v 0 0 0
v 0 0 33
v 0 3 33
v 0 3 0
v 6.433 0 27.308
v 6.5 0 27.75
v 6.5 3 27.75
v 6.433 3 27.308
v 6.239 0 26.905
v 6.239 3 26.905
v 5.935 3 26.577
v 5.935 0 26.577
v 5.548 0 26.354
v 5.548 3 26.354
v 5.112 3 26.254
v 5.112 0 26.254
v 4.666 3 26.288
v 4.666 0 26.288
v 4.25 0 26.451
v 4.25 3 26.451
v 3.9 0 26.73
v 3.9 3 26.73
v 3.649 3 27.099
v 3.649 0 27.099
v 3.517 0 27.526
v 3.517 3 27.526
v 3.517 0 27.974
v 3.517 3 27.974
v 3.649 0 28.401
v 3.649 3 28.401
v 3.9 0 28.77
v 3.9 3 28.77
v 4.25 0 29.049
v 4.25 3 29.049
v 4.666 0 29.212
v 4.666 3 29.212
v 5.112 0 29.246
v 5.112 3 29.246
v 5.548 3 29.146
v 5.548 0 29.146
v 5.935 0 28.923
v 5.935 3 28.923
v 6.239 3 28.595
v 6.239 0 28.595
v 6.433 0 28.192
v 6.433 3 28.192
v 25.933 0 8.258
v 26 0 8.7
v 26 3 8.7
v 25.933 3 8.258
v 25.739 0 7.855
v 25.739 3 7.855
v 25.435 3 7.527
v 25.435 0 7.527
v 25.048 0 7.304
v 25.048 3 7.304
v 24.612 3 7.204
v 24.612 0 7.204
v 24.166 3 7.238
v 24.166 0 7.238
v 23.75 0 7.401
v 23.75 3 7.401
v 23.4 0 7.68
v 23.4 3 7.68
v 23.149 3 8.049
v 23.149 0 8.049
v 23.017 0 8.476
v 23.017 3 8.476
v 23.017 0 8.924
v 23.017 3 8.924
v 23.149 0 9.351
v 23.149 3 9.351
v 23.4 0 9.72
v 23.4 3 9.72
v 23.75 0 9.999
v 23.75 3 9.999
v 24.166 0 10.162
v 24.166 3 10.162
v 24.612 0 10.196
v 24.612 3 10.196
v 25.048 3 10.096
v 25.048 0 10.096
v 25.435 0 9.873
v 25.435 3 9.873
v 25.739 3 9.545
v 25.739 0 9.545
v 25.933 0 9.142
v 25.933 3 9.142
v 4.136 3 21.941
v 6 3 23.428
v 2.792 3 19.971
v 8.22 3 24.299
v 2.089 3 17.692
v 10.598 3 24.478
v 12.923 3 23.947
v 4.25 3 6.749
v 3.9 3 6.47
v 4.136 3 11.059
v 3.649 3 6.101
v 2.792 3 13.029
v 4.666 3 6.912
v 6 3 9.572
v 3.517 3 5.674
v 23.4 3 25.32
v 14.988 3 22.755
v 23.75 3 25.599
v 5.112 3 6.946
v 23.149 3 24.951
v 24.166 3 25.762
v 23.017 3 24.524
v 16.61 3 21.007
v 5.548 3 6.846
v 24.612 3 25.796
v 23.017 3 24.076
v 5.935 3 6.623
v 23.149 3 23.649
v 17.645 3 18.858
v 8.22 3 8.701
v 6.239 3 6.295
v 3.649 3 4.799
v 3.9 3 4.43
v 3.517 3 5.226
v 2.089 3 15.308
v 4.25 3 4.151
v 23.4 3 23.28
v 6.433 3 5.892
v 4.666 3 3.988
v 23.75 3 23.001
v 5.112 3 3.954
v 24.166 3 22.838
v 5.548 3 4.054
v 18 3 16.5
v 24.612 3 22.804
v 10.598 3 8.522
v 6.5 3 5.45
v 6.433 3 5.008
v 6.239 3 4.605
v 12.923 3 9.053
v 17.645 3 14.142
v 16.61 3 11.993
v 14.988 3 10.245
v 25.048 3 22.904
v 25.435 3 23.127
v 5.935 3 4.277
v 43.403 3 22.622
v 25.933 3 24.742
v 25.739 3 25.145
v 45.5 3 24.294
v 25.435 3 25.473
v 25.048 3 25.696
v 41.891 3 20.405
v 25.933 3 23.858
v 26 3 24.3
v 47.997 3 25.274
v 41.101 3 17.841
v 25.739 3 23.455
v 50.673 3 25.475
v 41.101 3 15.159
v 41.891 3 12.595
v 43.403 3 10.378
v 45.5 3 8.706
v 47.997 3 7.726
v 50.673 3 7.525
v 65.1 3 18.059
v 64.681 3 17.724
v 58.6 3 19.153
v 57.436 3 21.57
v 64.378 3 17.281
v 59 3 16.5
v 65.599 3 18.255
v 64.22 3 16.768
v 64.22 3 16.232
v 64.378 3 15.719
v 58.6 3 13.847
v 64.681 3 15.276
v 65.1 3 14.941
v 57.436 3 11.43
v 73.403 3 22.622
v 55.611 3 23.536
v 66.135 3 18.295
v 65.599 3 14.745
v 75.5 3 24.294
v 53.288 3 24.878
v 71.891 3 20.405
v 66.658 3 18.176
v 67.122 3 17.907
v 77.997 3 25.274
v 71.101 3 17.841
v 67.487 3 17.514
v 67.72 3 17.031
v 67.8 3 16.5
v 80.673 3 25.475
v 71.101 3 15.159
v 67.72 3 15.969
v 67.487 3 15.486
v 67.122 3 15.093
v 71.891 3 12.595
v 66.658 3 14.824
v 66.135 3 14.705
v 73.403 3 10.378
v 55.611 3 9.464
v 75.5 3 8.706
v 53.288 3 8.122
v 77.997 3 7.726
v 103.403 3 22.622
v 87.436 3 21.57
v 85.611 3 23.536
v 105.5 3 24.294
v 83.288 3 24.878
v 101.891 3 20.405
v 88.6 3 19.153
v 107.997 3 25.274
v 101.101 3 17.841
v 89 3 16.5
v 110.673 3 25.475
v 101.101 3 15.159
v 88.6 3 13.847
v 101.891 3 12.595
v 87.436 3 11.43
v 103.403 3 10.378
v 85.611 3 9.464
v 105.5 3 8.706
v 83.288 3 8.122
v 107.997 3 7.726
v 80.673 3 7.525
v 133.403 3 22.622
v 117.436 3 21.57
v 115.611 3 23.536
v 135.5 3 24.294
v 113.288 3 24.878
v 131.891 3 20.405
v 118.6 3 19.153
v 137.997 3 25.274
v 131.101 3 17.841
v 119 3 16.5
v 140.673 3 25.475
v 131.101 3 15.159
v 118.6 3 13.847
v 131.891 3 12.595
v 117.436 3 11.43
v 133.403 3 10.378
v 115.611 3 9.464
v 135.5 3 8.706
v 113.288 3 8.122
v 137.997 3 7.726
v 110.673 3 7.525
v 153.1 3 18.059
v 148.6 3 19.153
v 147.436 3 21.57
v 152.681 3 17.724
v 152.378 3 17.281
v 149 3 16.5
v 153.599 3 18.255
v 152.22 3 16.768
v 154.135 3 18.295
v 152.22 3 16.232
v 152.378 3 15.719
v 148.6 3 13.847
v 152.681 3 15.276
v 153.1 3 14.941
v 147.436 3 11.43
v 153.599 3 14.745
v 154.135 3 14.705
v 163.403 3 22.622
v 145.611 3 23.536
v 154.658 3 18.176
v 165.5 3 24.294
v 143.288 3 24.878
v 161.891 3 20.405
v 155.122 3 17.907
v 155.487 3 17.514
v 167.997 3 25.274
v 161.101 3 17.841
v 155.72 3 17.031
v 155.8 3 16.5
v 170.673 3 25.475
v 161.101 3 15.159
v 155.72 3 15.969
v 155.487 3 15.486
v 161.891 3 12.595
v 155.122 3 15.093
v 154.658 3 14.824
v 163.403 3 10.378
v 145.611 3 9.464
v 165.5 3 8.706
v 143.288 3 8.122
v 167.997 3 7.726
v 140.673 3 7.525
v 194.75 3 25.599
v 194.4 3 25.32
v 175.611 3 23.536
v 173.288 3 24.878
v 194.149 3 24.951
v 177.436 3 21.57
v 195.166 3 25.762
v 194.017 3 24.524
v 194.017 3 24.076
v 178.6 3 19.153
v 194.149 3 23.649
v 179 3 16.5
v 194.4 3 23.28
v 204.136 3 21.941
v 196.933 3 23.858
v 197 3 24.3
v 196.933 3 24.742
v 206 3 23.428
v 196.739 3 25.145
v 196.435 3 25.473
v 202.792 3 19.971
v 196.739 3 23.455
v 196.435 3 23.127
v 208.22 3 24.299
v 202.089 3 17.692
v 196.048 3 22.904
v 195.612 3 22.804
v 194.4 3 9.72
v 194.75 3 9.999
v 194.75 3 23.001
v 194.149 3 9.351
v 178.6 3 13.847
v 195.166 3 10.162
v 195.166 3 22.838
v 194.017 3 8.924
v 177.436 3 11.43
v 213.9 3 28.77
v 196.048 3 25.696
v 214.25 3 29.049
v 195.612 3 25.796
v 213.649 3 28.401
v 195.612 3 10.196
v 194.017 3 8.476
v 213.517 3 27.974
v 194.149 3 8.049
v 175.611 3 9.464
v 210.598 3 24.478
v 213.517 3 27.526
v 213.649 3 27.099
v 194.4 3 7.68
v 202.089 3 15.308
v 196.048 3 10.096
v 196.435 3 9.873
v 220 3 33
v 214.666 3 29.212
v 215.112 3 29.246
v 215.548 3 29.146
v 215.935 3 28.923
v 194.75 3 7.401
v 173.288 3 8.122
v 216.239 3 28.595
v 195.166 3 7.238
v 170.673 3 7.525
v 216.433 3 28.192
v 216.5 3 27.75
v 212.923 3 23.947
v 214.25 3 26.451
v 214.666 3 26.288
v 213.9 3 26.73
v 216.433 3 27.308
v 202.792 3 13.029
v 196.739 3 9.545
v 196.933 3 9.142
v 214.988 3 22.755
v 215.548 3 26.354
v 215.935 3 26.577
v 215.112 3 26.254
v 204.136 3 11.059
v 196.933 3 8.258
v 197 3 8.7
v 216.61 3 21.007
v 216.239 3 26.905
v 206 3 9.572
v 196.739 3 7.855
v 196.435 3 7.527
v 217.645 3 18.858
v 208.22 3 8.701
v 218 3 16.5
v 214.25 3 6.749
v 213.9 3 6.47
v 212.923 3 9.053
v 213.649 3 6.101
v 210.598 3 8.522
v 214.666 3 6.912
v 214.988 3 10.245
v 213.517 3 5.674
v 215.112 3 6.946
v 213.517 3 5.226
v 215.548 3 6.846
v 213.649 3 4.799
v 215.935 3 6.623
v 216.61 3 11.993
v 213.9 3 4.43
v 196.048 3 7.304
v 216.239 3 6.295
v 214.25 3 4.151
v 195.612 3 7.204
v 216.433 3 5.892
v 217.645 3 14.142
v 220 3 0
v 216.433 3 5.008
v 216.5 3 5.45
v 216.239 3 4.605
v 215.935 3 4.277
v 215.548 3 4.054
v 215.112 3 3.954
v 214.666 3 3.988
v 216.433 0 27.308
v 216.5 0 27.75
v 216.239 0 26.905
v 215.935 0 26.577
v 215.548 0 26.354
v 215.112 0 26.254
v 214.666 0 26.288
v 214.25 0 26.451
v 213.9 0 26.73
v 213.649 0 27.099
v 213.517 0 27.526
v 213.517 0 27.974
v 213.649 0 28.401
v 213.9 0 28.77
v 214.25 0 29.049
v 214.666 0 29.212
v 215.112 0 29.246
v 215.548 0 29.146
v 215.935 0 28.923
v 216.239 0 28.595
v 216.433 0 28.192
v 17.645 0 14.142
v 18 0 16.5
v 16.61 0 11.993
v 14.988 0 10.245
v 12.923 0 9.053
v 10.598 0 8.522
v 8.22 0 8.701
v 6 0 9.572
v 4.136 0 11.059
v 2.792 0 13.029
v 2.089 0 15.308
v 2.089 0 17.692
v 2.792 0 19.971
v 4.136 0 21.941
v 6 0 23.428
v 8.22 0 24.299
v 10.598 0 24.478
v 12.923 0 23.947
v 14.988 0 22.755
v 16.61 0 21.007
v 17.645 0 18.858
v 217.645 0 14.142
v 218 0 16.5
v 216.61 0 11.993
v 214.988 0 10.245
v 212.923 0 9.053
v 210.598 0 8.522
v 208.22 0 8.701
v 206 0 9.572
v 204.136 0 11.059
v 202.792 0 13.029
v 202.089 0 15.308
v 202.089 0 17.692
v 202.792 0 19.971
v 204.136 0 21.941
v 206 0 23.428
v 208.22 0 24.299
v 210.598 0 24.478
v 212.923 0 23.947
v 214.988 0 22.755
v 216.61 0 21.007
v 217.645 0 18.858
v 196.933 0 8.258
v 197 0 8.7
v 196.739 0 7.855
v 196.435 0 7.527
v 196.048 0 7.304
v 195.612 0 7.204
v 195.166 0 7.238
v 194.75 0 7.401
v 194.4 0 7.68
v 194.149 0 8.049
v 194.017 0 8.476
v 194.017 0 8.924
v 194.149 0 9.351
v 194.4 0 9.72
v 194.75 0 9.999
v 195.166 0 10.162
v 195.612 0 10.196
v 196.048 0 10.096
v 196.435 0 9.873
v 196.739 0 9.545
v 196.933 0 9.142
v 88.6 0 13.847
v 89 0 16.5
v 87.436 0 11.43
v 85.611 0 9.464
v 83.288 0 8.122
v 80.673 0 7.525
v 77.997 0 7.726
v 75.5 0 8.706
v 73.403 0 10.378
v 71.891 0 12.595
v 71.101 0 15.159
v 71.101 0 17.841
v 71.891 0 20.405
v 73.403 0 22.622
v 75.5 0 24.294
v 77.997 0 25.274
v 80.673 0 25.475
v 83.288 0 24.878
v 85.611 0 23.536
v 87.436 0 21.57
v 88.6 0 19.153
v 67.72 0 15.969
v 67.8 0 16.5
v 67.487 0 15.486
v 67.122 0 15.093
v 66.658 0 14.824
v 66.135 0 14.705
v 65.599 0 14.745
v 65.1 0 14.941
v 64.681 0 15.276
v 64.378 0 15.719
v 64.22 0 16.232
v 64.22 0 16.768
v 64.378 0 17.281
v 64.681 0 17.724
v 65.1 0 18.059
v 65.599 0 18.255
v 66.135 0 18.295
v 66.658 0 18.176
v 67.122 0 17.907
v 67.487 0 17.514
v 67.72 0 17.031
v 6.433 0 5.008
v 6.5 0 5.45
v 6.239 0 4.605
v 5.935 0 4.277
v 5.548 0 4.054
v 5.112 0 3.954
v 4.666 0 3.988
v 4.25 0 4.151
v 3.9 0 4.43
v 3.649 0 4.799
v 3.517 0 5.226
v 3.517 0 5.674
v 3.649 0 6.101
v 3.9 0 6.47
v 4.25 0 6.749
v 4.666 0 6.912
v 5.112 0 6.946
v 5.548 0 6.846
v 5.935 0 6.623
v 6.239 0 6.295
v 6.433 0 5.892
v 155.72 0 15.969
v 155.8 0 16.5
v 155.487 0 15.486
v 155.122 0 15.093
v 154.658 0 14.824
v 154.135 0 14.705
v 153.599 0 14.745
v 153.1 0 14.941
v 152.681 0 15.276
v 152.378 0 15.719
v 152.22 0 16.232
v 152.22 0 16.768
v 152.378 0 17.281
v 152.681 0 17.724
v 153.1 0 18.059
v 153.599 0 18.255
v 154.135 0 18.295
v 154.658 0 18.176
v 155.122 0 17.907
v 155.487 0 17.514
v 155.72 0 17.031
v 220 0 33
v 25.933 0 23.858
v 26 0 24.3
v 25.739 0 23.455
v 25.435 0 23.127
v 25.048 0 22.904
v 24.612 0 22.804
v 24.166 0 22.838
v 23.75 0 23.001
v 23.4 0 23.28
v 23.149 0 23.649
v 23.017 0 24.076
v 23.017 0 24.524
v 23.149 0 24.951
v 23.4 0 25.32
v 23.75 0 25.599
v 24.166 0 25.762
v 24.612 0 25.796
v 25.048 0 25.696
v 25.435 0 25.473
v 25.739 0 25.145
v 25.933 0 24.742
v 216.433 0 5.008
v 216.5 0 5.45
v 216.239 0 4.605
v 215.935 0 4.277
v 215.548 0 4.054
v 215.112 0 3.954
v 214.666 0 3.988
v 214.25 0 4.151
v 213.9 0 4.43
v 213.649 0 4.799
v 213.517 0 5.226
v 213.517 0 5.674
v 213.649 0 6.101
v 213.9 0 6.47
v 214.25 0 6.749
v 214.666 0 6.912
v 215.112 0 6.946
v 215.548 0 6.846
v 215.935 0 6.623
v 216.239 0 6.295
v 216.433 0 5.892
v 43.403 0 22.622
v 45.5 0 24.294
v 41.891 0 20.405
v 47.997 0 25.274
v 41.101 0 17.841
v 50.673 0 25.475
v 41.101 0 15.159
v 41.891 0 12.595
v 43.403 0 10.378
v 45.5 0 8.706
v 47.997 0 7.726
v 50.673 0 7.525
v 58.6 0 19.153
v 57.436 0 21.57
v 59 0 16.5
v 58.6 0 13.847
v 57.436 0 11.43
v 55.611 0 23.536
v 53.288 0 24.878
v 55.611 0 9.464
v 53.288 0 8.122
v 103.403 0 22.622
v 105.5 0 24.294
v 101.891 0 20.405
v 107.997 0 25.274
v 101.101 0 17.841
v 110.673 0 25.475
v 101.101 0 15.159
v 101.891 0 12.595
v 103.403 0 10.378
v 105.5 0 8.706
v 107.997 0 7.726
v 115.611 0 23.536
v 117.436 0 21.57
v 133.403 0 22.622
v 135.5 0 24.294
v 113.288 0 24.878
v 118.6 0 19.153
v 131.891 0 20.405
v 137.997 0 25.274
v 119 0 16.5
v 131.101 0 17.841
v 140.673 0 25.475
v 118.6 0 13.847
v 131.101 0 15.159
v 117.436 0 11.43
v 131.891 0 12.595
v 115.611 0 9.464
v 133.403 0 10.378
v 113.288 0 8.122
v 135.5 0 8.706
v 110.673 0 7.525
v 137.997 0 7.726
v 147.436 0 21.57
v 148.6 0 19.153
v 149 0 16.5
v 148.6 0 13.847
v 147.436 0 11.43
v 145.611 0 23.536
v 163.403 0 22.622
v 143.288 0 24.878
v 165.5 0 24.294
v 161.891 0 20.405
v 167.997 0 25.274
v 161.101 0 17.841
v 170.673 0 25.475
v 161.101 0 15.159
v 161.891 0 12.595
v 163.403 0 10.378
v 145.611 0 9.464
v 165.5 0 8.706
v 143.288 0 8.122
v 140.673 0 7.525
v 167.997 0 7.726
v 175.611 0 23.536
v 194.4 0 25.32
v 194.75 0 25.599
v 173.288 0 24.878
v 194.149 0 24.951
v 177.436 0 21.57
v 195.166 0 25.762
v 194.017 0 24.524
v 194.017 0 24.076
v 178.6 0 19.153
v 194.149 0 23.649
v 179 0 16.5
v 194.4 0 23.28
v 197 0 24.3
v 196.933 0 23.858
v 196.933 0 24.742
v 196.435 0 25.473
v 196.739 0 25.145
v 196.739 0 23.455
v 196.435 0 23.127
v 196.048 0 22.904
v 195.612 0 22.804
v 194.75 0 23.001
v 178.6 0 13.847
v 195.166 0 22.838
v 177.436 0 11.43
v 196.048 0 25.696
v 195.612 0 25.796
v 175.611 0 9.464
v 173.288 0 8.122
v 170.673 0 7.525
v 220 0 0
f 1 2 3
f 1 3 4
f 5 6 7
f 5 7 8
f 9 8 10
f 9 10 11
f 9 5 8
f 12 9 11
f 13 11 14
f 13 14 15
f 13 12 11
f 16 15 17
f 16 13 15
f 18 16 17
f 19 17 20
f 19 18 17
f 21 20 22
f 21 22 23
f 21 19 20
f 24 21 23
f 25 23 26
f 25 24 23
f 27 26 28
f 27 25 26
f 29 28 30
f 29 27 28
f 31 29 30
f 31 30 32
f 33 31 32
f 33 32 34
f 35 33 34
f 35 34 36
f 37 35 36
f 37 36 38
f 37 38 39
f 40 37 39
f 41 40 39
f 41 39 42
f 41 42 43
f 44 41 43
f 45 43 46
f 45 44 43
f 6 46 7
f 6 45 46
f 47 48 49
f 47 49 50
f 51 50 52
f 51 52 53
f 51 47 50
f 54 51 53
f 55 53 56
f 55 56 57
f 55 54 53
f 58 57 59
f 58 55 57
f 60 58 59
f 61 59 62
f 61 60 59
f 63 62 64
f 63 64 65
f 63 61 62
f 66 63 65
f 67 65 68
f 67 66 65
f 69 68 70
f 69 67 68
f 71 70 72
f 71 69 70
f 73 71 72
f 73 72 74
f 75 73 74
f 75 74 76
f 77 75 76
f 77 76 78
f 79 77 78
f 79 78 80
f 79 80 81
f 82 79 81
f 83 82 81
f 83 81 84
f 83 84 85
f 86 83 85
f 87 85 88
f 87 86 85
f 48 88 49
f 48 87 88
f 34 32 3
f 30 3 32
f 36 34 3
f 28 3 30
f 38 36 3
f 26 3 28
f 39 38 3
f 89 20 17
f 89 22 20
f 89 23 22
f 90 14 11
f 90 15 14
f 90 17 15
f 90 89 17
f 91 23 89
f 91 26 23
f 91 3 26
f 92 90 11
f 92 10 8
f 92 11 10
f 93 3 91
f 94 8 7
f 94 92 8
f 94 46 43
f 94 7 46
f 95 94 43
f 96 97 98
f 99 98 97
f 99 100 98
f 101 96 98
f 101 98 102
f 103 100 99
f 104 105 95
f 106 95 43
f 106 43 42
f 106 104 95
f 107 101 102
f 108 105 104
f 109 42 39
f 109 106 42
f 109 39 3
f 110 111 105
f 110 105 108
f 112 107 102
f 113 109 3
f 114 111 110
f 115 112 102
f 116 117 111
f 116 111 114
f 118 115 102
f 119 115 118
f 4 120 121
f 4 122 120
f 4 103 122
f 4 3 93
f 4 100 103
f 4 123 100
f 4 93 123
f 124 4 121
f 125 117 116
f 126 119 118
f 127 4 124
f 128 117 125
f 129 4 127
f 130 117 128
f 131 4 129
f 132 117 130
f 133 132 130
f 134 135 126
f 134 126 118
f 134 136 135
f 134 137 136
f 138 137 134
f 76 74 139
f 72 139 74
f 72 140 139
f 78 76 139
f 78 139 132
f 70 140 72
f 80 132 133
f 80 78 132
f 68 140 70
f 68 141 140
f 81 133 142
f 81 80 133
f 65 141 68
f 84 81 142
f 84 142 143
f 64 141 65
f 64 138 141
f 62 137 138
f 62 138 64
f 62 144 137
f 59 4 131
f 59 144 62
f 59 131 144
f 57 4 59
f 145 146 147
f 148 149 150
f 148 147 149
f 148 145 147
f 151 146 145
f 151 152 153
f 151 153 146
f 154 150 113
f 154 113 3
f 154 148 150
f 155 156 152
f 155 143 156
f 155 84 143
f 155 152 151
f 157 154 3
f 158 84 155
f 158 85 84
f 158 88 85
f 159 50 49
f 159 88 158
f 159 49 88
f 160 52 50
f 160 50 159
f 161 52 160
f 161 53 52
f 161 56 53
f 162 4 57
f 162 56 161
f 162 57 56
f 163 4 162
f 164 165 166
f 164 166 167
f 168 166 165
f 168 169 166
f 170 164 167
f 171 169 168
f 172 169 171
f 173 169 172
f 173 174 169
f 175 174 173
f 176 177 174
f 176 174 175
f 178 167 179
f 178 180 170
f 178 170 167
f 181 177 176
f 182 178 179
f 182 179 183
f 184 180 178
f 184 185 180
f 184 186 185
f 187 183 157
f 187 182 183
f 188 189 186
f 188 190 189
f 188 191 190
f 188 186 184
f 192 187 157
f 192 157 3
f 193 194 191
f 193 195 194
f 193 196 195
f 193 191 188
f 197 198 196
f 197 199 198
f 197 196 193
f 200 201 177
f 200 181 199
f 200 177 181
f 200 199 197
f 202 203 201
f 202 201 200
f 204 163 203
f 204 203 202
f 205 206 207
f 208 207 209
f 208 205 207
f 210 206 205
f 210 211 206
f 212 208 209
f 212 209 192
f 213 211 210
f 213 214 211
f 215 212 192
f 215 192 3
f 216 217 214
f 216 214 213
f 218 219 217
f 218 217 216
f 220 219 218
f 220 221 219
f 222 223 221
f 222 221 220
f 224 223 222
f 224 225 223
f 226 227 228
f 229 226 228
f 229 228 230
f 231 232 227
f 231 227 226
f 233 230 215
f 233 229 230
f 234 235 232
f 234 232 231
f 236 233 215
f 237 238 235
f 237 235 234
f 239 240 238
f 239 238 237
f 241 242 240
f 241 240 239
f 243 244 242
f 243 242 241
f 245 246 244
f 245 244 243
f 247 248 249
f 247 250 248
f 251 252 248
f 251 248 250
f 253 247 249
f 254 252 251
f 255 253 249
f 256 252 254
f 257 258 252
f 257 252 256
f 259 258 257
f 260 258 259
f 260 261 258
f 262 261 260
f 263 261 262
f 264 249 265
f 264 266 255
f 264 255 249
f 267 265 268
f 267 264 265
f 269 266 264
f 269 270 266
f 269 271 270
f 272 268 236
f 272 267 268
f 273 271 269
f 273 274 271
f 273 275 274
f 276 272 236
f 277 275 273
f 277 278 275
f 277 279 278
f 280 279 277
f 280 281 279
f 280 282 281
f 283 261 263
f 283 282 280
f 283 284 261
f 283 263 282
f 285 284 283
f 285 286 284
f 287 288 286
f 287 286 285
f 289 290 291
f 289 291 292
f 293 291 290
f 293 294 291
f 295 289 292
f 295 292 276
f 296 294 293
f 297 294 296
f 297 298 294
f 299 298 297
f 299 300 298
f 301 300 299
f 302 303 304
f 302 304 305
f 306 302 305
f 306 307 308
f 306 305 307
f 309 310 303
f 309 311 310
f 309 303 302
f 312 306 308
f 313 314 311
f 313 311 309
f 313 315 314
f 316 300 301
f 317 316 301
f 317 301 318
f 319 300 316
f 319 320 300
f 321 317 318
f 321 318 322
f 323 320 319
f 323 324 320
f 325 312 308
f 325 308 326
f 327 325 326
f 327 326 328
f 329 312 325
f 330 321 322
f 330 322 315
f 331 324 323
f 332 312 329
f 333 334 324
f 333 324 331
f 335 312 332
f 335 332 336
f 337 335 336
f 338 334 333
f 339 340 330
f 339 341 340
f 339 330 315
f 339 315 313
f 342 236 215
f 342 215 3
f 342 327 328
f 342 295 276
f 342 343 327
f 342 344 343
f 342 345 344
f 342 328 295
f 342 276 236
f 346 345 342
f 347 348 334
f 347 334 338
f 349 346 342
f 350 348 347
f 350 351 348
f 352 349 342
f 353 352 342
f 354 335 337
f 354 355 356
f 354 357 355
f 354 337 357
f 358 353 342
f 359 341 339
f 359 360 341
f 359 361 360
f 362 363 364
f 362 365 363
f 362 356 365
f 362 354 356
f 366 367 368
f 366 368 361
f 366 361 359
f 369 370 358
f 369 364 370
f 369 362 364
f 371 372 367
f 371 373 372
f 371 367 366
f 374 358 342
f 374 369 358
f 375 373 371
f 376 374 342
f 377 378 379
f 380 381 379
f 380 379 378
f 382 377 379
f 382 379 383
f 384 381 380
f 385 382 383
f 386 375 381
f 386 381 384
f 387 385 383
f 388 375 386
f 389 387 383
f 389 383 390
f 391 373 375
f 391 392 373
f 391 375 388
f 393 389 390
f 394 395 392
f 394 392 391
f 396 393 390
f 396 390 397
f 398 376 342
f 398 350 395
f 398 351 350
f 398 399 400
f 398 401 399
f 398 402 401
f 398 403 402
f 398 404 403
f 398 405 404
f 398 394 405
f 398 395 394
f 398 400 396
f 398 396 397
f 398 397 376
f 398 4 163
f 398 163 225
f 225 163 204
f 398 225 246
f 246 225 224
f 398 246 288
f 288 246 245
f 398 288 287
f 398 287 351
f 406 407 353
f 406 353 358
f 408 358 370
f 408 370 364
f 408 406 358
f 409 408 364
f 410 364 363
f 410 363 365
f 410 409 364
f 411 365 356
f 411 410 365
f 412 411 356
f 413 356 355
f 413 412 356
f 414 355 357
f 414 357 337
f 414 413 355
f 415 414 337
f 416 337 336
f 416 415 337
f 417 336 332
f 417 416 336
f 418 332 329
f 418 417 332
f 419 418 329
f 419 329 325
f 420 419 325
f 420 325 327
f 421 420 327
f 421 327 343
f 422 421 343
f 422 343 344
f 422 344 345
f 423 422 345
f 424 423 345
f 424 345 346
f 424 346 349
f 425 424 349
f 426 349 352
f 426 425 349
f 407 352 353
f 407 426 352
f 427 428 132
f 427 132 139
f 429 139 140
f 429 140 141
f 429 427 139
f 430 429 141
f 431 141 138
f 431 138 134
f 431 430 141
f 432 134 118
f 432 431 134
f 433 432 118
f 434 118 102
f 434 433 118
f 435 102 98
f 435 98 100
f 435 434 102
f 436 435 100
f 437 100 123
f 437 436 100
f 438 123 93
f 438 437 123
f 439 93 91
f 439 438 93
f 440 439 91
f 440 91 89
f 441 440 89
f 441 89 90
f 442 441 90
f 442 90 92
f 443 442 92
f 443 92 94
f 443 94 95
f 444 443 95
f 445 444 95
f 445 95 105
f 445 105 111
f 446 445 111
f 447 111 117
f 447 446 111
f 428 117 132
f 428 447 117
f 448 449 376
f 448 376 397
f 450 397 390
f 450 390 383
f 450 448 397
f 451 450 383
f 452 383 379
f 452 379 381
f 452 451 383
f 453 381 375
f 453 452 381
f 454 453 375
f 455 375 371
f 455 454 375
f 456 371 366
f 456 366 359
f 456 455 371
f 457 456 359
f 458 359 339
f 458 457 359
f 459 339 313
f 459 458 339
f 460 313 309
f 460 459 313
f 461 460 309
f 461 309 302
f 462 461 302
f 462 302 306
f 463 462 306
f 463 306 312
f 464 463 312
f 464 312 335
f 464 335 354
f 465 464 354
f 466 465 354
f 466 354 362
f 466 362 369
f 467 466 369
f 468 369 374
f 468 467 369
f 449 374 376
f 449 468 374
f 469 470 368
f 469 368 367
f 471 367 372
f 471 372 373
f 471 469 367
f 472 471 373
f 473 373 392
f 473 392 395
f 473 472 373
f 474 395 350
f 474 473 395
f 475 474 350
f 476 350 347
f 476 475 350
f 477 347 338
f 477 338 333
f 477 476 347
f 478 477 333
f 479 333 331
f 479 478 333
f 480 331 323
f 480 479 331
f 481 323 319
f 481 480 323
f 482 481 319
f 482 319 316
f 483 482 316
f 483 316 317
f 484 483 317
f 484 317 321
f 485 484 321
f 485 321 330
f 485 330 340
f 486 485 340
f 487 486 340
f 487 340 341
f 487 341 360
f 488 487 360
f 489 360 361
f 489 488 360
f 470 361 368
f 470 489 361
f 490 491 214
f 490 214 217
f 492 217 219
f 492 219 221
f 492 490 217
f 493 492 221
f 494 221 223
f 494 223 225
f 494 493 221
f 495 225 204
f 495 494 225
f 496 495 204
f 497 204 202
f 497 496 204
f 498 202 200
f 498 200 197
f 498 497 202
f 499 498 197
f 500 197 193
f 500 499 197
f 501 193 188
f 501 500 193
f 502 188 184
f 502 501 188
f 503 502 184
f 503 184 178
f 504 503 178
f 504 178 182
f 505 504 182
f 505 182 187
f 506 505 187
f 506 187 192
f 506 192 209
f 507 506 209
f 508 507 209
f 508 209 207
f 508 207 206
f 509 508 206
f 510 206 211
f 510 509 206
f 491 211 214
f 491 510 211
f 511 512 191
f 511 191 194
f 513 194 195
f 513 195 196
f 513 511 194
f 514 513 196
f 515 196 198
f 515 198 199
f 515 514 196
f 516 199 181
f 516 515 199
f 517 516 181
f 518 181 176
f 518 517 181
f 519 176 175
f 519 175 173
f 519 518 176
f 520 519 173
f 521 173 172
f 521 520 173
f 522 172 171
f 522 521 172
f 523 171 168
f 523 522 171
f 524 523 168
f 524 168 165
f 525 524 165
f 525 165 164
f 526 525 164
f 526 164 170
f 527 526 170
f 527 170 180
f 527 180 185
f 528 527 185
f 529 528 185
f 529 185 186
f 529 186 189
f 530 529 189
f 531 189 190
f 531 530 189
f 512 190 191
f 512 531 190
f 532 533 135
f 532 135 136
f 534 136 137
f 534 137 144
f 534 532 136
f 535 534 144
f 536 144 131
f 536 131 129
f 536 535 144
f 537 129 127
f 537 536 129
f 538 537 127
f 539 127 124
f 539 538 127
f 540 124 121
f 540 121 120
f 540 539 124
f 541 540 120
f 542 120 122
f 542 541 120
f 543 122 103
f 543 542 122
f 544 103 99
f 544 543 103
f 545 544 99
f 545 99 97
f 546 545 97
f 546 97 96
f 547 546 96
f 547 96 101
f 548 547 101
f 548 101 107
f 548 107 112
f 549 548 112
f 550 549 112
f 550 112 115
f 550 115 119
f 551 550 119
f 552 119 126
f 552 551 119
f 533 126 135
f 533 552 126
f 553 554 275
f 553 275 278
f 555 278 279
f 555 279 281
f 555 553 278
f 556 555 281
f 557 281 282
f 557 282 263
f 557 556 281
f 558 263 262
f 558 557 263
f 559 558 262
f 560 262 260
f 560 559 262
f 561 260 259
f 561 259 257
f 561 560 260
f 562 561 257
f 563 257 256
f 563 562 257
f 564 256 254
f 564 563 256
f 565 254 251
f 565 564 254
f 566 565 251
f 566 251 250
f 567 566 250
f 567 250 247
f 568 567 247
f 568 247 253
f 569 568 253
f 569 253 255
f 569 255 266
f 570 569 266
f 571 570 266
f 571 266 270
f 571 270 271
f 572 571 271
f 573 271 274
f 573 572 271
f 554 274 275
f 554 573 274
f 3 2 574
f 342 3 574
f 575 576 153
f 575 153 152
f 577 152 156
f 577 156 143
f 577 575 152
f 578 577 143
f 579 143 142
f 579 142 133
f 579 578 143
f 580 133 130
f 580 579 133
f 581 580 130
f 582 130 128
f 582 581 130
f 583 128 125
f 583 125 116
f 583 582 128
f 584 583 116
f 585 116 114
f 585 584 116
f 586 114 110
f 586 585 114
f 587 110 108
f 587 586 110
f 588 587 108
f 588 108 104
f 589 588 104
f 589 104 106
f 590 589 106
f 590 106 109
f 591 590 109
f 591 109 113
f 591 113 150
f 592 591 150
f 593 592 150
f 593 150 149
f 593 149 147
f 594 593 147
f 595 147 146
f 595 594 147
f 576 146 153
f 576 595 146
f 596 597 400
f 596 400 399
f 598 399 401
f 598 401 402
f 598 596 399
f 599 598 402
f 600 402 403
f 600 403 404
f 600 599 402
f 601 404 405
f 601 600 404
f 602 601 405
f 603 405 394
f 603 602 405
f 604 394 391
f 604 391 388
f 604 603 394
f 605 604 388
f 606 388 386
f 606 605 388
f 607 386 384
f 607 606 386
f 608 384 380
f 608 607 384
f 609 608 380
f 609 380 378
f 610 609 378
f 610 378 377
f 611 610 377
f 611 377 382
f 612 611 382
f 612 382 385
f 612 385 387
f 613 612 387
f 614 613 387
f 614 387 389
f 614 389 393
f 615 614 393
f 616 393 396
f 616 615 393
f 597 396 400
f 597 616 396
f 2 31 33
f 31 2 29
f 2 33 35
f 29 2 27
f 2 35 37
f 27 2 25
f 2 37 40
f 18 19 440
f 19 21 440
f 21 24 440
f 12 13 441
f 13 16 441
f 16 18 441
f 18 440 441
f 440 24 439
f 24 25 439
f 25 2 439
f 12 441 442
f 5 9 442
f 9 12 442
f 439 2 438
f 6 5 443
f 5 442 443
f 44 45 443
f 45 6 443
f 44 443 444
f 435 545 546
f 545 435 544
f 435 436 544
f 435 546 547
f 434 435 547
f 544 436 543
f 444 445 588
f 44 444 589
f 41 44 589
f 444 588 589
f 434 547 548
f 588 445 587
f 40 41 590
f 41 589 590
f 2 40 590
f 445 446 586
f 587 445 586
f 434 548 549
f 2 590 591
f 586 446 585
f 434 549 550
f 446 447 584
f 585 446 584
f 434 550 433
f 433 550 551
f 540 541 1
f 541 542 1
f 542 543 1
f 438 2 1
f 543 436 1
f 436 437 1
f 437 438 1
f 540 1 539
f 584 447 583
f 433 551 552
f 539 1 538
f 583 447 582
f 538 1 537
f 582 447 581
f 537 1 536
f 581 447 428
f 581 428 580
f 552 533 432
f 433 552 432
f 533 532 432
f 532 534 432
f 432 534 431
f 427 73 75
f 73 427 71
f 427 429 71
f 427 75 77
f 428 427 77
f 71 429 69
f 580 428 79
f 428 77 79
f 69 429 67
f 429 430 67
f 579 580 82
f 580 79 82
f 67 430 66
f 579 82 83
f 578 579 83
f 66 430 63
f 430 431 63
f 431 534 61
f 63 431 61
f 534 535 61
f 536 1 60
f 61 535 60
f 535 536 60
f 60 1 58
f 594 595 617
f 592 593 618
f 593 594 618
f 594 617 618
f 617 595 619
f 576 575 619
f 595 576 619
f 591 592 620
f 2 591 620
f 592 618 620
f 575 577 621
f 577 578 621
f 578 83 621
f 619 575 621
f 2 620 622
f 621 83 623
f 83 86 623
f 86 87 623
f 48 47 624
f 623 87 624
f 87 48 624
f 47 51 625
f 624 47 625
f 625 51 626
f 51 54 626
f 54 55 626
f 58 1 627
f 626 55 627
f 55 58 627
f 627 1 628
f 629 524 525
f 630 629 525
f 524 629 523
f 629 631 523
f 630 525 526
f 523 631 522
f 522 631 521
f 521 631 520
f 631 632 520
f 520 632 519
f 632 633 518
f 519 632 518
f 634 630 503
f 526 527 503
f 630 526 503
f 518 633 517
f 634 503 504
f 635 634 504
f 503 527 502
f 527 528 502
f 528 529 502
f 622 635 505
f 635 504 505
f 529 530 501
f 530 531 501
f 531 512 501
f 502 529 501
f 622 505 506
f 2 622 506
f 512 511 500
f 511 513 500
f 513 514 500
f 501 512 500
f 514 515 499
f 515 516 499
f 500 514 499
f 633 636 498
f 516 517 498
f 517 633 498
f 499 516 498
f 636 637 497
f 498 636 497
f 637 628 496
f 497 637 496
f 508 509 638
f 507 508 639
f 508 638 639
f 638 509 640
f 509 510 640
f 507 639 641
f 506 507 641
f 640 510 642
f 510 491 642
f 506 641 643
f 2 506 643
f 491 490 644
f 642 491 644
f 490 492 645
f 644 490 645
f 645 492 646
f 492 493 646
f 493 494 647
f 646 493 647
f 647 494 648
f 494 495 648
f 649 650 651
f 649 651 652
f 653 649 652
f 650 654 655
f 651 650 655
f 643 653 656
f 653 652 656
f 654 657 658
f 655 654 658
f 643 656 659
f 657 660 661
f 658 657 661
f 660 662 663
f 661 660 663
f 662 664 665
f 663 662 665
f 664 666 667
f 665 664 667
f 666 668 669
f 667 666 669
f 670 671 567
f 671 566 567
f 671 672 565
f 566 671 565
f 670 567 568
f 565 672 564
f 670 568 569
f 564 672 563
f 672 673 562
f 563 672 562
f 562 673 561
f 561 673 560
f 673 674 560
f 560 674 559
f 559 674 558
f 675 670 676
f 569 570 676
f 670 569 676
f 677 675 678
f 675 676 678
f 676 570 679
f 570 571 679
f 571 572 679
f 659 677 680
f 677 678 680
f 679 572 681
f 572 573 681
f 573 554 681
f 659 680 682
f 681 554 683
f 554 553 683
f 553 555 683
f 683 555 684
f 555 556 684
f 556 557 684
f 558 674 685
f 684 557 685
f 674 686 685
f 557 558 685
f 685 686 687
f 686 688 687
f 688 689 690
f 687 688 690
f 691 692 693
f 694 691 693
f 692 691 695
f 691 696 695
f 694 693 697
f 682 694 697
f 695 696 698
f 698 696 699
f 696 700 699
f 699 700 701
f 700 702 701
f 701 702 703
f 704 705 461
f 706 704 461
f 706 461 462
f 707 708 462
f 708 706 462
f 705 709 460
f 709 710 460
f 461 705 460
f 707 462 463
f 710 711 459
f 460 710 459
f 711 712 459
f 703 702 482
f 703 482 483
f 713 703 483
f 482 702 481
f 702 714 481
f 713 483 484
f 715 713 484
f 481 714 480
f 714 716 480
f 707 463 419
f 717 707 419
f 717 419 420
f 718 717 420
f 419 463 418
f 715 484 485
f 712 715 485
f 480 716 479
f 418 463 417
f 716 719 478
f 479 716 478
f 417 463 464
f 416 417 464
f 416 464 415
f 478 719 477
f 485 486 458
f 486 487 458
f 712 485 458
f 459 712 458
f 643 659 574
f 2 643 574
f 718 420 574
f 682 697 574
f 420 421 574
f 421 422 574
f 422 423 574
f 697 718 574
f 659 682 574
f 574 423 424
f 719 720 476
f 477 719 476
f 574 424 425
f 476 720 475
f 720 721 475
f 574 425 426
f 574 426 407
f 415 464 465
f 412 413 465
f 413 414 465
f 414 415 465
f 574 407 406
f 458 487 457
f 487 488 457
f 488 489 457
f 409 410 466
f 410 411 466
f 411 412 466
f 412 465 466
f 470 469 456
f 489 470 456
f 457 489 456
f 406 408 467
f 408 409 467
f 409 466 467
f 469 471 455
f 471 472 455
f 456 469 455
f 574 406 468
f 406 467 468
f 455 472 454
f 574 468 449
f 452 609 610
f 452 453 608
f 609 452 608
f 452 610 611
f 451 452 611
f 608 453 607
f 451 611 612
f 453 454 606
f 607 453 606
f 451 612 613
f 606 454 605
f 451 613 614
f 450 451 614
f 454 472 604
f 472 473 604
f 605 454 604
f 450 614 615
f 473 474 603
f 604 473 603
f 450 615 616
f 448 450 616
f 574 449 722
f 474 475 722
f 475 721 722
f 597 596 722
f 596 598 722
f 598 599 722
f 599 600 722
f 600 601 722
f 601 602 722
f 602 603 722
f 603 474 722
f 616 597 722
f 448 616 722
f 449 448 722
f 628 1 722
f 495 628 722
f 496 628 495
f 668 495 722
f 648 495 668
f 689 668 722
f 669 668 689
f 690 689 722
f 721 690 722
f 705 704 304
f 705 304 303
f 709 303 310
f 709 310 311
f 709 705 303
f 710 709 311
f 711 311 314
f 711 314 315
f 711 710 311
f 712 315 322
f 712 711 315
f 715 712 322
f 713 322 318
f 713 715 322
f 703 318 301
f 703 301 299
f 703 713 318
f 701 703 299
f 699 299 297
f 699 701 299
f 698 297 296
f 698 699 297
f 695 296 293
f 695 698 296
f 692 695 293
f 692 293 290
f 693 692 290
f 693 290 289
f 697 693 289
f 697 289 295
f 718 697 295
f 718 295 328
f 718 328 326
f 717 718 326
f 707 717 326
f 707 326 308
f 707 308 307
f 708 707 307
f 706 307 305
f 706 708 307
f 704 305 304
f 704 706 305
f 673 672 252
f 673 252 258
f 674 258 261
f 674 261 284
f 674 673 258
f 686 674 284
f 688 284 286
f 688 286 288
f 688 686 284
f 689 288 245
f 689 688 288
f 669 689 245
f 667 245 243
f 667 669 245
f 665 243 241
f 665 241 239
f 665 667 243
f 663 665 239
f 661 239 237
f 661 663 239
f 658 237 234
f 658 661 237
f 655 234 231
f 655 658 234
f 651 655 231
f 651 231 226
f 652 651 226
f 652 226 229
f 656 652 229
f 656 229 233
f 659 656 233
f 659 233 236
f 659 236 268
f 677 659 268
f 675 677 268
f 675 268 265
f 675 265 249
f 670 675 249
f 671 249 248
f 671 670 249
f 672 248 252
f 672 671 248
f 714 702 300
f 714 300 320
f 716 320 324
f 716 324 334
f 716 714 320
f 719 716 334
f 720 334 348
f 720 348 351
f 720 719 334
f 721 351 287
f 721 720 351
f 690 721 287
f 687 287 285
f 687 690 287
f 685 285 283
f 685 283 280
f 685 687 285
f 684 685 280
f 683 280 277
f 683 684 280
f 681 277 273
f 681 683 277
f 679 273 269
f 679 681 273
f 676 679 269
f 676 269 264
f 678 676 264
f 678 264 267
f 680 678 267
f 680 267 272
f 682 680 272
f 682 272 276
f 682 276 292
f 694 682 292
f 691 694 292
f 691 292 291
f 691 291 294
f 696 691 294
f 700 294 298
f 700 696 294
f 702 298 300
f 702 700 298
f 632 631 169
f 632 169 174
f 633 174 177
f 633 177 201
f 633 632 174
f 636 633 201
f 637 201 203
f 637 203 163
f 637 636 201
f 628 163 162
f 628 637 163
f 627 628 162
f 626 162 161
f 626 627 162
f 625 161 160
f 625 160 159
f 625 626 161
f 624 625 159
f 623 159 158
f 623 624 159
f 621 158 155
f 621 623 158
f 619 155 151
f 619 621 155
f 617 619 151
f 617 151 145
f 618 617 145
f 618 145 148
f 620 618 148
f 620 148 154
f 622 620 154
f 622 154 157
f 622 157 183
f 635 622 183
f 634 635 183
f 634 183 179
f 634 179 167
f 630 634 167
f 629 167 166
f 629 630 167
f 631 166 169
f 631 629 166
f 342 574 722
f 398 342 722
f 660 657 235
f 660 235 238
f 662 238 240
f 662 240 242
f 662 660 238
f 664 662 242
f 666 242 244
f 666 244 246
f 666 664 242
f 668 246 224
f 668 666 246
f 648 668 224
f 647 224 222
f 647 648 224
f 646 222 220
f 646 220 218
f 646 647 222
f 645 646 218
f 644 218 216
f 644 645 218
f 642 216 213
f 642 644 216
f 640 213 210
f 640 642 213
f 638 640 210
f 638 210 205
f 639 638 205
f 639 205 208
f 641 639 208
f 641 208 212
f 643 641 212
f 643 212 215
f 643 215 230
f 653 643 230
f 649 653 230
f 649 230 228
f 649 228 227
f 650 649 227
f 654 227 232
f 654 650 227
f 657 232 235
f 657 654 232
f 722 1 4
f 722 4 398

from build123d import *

# Parameters (mm, degrees)
SKETCH_1_W      = 220
SKETCH_1_H      = 33
SKETCH_1_R      = 1.5
SKETCH_1_R_2    = 9
SKETCH_1_R_3    = 8
SKETCH_1_R_4    = 1.8
EXTRUDE_1_DEPTH = 3


with BuildPart() as part:
    # 草图1 → 凸台-拉伸1 (new body)
    with BuildSketch(Plane(origin=(0, 0, 0), x_dir=(1, 0, 0), z_dir=(0, 1, 0))):
        with Locations((110, -16.5)):
            Rectangle(SKETCH_1_W, SKETCH_1_H)
        with Locations((5, -27.75)):
            Circle(SKETCH_1_R, mode=Mode.SUBTRACT)
        with Locations((5, -5.45)):
            Circle(SKETCH_1_R, mode=Mode.SUBTRACT)
        with Locations((24.5, -8.7)):
            Circle(SKETCH_1_R, mode=Mode.SUBTRACT)
        with Locations((24.5, -24.3)):
            Circle(SKETCH_1_R, mode=Mode.SUBTRACT)
        with Locations((195.5, -8.7)):
            Circle(SKETCH_1_R, mode=Mode.SUBTRACT)
        with Locations((195.5, -24.3)):
            Circle(SKETCH_1_R, mode=Mode.SUBTRACT)
        with Locations((215, -27.75)):
            Circle(SKETCH_1_R, mode=Mode.SUBTRACT)
        with Locations((215, -5.45)):
            Circle(SKETCH_1_R, mode=Mode.SUBTRACT)
        with Locations((110, -16.5)):
            Circle(SKETCH_1_R_2, mode=Mode.SUBTRACT)
        with Locations((140, -16.5)):
            Circle(SKETCH_1_R_2, mode=Mode.SUBTRACT)
        with Locations((10, -16.5)):
            Circle(SKETCH_1_R_3, mode=Mode.SUBTRACT)
        with Locations((210, -16.5)):
            Circle(SKETCH_1_R_3, mode=Mode.SUBTRACT)
        with Locations((170, -16.5)):
            Circle(SKETCH_1_R_2, mode=Mode.SUBTRACT)
        with Locations((80, -16.5)):
            Circle(SKETCH_1_R_2, mode=Mode.SUBTRACT)
        with Locations((50, -16.5)):
            Circle(SKETCH_1_R_2, mode=Mode.SUBTRACT)
        with Locations((154, -16.5)):
            Circle(SKETCH_1_R_4, mode=Mode.SUBTRACT)
        with Locations((66, -16.5)):
            Circle(SKETCH_1_R_4, mode=Mode.SUBTRACT)
    extrude(amount=EXTRUDE_1_DEPTH)


solid = part.part
